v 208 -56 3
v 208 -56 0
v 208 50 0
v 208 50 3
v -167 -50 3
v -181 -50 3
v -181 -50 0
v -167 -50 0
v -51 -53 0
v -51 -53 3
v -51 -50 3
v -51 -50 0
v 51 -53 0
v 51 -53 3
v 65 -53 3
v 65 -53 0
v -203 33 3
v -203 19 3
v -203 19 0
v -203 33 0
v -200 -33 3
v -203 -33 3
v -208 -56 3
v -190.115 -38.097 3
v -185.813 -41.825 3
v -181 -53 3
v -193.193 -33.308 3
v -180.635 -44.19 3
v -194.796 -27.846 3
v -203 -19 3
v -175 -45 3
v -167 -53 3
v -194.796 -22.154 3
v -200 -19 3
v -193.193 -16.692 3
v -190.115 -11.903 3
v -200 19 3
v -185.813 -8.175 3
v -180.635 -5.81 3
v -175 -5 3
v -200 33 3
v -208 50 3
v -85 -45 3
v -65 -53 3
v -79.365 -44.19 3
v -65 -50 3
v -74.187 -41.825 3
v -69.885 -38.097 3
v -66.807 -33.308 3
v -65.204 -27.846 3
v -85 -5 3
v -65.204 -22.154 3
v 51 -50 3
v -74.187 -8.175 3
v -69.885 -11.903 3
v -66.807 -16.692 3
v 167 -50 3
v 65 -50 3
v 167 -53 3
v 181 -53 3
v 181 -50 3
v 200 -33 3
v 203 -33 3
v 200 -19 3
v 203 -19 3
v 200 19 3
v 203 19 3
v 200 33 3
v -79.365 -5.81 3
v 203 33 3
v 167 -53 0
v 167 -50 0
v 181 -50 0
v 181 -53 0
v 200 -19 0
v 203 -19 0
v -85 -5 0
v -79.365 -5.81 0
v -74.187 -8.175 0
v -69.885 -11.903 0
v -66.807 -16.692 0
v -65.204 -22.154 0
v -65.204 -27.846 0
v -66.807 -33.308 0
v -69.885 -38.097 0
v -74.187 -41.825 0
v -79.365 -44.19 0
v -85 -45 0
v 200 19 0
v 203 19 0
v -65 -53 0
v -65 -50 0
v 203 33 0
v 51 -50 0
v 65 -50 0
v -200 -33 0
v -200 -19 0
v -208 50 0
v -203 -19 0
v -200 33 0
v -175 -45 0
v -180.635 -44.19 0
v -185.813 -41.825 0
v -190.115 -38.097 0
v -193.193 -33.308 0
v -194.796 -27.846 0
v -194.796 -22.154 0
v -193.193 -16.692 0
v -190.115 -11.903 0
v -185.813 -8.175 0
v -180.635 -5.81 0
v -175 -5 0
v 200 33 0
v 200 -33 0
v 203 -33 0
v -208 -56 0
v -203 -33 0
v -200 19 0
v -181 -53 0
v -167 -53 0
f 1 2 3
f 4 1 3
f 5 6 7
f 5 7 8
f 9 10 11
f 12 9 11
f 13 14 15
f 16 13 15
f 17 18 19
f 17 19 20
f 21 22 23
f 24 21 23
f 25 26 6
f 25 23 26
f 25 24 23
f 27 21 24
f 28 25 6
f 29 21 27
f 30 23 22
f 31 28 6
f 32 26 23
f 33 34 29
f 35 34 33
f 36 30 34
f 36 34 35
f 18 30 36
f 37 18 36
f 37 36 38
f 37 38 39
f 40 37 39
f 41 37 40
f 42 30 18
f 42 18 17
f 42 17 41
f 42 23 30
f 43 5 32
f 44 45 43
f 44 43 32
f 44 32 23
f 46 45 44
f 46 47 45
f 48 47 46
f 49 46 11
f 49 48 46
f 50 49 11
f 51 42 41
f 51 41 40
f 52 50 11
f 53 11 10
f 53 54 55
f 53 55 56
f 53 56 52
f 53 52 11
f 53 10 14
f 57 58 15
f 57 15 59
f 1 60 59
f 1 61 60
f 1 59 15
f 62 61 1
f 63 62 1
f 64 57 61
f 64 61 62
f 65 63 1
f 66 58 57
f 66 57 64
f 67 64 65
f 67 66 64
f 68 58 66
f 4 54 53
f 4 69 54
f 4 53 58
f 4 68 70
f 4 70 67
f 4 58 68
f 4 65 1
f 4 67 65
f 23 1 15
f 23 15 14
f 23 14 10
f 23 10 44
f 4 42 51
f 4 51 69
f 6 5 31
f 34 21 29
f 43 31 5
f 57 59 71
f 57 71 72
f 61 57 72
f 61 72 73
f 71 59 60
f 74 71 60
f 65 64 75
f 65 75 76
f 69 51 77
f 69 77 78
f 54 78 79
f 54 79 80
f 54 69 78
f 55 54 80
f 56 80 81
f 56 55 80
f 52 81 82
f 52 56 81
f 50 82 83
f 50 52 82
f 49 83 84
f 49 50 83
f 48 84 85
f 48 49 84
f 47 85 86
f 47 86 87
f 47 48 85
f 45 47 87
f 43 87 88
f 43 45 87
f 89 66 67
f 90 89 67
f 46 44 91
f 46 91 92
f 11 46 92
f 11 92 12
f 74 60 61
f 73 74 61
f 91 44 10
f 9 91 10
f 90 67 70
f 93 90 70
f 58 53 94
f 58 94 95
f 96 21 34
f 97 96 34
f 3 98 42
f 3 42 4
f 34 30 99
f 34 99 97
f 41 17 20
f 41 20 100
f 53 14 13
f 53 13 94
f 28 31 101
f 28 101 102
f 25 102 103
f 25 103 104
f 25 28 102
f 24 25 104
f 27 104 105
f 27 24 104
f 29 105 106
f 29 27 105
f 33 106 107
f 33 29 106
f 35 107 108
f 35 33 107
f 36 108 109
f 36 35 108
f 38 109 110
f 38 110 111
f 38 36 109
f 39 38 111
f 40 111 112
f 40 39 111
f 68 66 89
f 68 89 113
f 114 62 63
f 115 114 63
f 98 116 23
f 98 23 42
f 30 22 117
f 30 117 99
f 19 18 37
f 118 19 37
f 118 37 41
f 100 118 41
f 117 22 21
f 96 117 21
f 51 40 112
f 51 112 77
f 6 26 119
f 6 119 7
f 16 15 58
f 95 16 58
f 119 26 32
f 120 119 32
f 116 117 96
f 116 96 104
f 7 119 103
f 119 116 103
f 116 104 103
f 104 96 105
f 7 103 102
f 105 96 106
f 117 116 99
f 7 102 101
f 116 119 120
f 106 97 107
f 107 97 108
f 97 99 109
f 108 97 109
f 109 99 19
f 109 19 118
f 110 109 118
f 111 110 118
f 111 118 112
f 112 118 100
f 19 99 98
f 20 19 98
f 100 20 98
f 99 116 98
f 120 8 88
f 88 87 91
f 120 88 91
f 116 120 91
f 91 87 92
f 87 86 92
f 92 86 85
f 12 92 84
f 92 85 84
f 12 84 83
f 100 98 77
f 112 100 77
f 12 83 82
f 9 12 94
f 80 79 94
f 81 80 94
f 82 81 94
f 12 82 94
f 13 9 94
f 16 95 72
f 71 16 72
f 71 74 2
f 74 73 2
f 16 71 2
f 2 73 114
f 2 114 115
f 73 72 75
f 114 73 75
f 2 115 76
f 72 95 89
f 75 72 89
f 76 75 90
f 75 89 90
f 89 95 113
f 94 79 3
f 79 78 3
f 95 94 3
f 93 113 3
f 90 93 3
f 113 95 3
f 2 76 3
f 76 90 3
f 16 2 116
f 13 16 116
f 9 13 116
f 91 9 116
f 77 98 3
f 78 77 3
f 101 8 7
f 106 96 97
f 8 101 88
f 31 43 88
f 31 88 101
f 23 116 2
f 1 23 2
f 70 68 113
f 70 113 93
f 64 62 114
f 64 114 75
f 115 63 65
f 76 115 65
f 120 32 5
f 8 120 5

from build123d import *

# Parameters (mm, degrees)
SKETCH1_W           = 416
SKETCH1_H           = 106
BOSS_EXTRUDE1_DEPTH = 3
SKETCH2_W           = 3
SKETCH2_H           = 14
SKETCH2_W_2         = 14
SKETCH2_H_2         = 3
CUT_EXTRUDE1_DEPTH  = 3
CUT_EXTRUDE2_DEPTH  = 3


with BuildPart() as part:
    # Sketch1 → Boss-Extrude1 (new body)
    with BuildSketch(Plane.XY):
        with Locations((0, -3)):
            Rectangle(SKETCH1_W, SKETCH1_H)
    extrude(amount=BOSS_EXTRUDE1_DEPTH)

    # Sketch2 → Cut-Extrude1 (cut)
    with BuildSketch(Plane.XY.offset(3)):
        with Locations((201.5, 26)):
            Rectangle(SKETCH2_W, SKETCH2_H)
        with Locations((-201.5, 26)):
            Rectangle(SKETCH2_W, SKETCH2_H)
        with Locations((201.5, -26)):
            Rectangle(SKETCH2_W, SKETCH2_H)
        with Locations((-201.5, -26)):
            Rectangle(SKETCH2_W, SKETCH2_H)
        with Locations((174, -51.5)):
            Rectangle(SKETCH2_W_2, SKETCH2_H_2)
        with Locations((-174, -51.5)):
            Rectangle(SKETCH2_W_2, SKETCH2_H_2)
        with Locations((58, -51.5)):
            Rectangle(SKETCH2_W_2, SKETCH2_H_2)
        with Locations((-58, -51.5)):
            Rectangle(SKETCH2_W_2, SKETCH2_H_2)
    extrude(amount=-CUT_EXTRUDE1_DEPTH, mode=Mode.SUBTRACT)

    # Sketch4 → Cut-Extrude2 (cut)
    with BuildSketch(Plane.XY.offset(3)):
        with BuildLine():
            Line((-175, -5), (-85, -5))
            ThreePointArc((-85, -5), (-65, -25), (-85, -45))
            Line((-85, -45), (-175, -45))
            ThreePointArc((-175, -45), (-195, -25), (-175, -5))
        make_face()
    extrude(amount=-CUT_EXTRUDE2_DEPTH, mode=Mode.SUBTRACT)


solid = part.part
